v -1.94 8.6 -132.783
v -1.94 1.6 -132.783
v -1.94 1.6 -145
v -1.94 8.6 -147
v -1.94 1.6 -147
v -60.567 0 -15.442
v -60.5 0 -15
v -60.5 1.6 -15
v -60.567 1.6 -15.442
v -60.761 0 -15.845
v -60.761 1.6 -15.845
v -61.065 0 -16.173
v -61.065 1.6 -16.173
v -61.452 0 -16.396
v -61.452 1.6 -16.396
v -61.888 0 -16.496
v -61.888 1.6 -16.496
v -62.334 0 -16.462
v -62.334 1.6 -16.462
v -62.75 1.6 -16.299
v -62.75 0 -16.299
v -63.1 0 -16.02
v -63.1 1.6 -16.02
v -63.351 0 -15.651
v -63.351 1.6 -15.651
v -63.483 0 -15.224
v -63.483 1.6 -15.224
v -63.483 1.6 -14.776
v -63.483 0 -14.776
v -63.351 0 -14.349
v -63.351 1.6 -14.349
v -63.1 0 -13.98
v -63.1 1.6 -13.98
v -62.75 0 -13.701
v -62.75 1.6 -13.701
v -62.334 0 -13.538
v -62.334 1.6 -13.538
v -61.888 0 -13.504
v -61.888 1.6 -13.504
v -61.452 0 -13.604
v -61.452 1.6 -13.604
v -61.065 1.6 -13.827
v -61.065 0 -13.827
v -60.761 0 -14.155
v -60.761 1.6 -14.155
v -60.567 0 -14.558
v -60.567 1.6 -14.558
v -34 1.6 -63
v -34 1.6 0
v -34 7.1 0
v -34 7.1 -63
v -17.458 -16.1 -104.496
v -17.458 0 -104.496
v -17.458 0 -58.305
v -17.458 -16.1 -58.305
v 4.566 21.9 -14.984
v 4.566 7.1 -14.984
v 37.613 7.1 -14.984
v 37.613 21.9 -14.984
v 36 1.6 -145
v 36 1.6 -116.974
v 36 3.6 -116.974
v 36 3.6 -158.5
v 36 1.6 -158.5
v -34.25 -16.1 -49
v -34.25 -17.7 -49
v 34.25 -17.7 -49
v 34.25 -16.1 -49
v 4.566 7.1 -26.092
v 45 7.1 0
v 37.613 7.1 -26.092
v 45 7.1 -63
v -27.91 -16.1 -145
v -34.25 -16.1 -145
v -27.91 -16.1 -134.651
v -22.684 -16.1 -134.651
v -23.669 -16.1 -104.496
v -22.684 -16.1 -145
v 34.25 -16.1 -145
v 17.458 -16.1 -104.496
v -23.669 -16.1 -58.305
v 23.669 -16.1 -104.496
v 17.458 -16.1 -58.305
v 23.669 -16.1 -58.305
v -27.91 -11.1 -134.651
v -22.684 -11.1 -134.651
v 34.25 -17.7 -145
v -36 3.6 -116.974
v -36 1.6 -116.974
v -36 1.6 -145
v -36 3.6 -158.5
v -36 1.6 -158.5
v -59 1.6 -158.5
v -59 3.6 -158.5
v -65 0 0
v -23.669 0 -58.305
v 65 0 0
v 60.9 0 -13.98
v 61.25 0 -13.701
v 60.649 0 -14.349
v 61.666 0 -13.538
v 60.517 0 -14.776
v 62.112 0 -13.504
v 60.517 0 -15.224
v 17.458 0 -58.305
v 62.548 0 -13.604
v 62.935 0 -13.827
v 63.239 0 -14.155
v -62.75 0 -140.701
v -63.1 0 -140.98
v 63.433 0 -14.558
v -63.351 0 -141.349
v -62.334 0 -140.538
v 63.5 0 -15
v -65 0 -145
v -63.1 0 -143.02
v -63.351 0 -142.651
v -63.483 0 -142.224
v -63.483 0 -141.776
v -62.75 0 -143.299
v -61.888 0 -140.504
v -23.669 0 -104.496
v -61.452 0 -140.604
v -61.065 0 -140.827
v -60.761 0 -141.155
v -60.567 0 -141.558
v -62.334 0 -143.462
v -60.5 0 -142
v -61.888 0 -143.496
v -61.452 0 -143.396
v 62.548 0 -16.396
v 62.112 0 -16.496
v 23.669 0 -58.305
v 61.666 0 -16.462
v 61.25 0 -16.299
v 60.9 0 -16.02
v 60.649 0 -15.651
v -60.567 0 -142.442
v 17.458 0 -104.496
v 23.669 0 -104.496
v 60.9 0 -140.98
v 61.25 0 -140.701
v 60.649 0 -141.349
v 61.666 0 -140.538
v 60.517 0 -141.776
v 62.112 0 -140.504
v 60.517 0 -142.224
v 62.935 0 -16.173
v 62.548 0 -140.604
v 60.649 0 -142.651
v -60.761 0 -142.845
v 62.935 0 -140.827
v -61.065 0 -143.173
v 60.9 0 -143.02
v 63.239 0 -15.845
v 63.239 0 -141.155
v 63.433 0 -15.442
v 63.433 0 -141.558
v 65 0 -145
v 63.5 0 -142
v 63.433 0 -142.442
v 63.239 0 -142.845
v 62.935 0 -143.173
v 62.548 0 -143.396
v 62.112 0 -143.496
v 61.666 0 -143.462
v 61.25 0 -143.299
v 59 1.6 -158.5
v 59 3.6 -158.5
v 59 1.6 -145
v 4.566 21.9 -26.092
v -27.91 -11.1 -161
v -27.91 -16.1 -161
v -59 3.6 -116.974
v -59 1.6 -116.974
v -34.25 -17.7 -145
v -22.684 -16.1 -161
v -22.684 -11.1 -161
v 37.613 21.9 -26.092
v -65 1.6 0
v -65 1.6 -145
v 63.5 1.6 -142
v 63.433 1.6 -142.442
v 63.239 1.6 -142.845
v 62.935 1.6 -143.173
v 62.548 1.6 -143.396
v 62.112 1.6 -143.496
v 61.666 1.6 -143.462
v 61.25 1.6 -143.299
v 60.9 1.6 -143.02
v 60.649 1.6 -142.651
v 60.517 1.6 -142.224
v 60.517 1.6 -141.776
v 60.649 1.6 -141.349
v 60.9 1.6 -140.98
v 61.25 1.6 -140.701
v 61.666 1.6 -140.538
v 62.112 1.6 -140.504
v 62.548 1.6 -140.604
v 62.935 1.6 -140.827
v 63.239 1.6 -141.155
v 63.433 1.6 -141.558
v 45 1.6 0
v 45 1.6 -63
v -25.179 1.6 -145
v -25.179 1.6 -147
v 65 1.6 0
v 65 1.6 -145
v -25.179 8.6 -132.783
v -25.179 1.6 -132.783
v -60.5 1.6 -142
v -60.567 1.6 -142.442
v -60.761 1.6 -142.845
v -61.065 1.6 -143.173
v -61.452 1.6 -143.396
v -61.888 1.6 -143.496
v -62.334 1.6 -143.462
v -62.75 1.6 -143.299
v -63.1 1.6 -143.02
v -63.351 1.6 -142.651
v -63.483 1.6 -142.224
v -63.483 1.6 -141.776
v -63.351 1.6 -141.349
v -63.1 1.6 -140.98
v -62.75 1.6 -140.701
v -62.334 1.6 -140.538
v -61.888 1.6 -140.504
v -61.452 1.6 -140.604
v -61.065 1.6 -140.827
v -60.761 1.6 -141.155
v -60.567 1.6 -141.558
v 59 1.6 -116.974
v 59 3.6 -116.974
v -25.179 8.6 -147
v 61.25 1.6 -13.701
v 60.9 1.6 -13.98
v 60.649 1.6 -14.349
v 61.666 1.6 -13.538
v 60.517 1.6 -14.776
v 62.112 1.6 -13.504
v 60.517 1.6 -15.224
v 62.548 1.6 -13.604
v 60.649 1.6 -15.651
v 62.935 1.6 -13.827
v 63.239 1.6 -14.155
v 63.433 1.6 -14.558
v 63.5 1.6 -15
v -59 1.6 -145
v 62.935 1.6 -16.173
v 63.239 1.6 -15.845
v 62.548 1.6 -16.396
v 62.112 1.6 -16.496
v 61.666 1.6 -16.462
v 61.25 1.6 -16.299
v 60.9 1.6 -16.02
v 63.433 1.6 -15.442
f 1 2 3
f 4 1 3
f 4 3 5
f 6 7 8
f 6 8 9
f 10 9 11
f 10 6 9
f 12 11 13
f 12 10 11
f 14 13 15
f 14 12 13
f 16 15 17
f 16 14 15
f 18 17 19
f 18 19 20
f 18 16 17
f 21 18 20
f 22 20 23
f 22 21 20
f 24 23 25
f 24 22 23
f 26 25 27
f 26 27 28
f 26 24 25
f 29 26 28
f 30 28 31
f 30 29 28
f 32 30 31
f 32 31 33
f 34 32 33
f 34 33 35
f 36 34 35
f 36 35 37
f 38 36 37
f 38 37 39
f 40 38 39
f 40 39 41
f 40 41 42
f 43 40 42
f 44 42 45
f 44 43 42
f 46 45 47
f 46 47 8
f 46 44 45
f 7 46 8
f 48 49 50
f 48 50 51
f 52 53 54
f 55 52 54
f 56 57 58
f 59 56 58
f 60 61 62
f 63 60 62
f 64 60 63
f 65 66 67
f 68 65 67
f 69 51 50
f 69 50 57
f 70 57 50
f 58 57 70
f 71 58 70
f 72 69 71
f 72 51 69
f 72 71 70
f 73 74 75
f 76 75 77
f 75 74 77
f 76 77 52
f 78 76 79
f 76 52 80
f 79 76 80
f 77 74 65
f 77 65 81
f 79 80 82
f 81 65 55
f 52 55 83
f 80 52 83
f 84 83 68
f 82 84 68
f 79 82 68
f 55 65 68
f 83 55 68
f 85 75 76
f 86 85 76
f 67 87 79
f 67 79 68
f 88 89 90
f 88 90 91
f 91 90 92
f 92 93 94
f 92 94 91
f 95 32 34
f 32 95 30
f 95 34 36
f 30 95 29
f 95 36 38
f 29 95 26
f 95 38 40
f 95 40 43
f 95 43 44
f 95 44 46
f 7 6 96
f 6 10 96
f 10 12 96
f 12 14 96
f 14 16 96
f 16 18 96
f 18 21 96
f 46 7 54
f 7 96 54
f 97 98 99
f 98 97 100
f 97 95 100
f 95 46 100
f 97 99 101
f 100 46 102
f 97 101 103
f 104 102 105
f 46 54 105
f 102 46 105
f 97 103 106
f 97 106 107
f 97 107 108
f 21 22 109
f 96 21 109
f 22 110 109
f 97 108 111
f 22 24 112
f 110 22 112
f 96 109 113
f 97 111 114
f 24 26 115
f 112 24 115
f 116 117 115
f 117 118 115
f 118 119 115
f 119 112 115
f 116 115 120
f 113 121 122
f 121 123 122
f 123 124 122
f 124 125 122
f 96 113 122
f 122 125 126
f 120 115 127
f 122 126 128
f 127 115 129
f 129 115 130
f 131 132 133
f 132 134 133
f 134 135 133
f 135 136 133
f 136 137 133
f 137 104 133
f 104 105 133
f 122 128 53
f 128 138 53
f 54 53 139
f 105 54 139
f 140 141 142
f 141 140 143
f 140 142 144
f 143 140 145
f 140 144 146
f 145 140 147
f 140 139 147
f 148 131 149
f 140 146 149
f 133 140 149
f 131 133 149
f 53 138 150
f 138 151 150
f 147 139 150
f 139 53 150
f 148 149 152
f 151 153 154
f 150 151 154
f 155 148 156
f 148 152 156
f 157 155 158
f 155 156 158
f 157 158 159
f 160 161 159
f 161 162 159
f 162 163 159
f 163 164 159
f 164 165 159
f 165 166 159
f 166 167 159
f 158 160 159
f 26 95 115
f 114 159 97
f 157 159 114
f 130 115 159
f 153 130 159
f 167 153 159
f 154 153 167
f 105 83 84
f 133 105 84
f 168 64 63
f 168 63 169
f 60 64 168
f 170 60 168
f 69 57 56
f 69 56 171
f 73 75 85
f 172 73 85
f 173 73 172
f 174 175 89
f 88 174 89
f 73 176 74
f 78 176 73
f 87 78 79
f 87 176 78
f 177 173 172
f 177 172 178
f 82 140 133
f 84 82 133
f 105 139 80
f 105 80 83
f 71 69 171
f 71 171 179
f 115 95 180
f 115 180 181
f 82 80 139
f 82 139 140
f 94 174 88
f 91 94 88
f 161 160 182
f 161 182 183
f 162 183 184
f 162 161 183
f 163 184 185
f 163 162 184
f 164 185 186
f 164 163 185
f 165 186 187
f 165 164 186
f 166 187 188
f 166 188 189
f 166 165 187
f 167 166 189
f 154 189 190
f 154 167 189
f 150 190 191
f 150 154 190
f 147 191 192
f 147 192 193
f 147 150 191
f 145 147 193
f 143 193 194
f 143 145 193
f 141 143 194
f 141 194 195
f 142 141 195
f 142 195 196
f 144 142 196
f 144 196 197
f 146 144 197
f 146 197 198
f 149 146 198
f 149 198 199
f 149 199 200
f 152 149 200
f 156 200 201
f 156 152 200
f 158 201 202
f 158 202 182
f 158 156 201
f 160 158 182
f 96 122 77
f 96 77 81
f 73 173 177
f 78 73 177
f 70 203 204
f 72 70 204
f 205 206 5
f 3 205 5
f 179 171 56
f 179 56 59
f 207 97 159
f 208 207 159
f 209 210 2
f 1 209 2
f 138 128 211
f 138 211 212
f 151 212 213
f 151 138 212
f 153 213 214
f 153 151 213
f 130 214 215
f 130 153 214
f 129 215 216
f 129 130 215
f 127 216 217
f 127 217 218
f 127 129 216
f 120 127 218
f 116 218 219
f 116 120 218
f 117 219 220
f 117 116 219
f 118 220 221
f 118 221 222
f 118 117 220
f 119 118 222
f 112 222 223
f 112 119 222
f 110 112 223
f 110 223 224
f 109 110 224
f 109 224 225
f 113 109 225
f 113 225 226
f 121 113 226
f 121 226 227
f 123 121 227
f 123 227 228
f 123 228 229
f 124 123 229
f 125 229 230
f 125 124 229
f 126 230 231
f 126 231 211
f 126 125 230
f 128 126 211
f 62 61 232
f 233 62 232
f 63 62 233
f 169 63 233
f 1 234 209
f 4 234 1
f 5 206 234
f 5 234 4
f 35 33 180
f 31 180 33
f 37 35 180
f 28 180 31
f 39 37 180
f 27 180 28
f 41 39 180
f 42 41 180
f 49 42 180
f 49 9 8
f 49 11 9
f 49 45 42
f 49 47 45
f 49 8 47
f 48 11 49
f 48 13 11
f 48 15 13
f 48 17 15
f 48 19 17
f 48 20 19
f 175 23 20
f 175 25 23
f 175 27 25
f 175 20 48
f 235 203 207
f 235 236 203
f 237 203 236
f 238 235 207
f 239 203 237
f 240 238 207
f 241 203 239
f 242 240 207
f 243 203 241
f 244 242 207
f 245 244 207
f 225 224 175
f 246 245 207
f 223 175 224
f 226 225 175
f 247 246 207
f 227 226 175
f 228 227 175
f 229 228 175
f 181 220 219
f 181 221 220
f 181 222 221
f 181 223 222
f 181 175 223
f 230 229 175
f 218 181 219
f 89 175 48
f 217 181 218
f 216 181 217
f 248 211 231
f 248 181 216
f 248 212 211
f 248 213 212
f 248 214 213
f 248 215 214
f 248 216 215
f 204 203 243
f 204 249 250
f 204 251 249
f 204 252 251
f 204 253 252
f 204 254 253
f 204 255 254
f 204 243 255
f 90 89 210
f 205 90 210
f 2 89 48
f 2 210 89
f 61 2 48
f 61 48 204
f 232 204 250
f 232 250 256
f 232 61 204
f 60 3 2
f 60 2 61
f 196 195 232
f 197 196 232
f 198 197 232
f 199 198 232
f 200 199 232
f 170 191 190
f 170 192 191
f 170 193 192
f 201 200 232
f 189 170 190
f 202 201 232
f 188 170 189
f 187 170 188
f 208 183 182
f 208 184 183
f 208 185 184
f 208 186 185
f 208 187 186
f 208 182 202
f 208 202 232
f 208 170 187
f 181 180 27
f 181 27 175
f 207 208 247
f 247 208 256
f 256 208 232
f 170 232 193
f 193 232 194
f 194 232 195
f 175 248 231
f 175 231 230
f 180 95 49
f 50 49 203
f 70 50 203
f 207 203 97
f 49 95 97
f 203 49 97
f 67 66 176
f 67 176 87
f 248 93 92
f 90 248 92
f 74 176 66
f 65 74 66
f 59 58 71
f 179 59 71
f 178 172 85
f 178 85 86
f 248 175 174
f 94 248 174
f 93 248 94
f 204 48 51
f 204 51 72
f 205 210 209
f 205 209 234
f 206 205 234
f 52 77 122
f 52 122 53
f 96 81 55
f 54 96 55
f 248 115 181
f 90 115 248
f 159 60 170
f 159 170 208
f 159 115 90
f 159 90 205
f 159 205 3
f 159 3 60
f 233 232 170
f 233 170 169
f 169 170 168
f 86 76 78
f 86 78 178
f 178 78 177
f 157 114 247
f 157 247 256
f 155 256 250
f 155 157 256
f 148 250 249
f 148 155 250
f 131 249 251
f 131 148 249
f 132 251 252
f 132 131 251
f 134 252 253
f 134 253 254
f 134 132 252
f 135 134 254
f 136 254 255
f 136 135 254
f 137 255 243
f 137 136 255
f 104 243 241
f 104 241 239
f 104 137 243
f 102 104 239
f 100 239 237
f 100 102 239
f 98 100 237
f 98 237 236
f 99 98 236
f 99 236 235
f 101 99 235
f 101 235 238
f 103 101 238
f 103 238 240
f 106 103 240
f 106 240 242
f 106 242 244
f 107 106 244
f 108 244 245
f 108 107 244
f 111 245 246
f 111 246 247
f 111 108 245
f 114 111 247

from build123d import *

# Parameters (mm, degrees)
ESQUISSE1_W        = 130
ESQUISSE1_H        = 145
ESQUISSE1_R        = 1.5
BOSS_EXTRU_1_DEPTH = 1.6
ESQUISSE2_W        = 79
ESQUISSE2_H        = 63
BOSS_EXTRU_2_DEPTH = 5.5
ESQUISSE3_W        = 33.047140846
ESQUISSE3_H        = 11.107836296
BOSS_EXTRU_3_DEPTH = 14.8
ESQUISSE4_W        = 23.239665889
ESQUISSE4_H        = 14.216628141
BOSS_EXTRU_4_DEPTH = 7
ESQUISSE5_W        = 23
ESQUISSE5_H        = 41.525911652
BOSS_EXTRU_5_DEPTH = 2
ESQUISSE6_W        = 6.210910455
ESQUISSE6_H        = 46.190495577
BOSS_EXTRU_6_DEPTH = 17.7
ESQUISSE7_W        = 68.5
ESQUISSE7_H        = 96
BOSS_EXTRU_7_DEPTH = 1.6
ESQUISSE8_W        = 5.226174608
ESQUISSE8_H        = 26.34937469
BOSS_EXTRU_8_DEPTH = 5


with BuildPart() as part:
    # Esquisse1 → Boss.-Extru.1 (new body)
    with BuildSketch(Plane(origin=(0, 0, 0), x_dir=(1, 0, 0), z_dir=(0, 1, 0))):
        with Locations((0, 72.5)):
            Rectangle(ESQUISSE1_W, ESQUISSE1_H)
        with Locations((-62, 142)):
            Circle(ESQUISSE1_R, mode=Mode.SUBTRACT)
        with Locations((62, 142)):
            Circle(ESQUISSE1_R, mode=Mode.SUBTRACT)
        with Locations((62, 15)):
            Circle(ESQUISSE1_R, mode=Mode.SUBTRACT)
        with Locations((-62, 15)):
            Circle(ESQUISSE1_R, mode=Mode.SUBTRACT)
    extrude(amount=BOSS_EXTRU_1_DEPTH)

    # Esquisse2 → Boss.-Extru.2 (add)
    with BuildSketch(Plane(origin=(0, 1.6, 0), x_dir=(1, 0, 0), z_dir=(0, 1, 0))):
        with Locations((5.5, 31.5)):
            Rectangle(ESQUISSE2_W, ESQUISSE2_H)
    extrude(amount=BOSS_EXTRU_2_DEPTH)

    # Esquisse3 → Boss.-Extru.3 (add)
    with BuildSketch(Plane(origin=(0, 7.1, 0), x_dir=(1, 0, 0), z_dir=(0, 1, 0))):
        with Locations((21.089415125, 20.538253018)):
            Rectangle(ESQUISSE3_W, ESQUISSE3_H)
    extrude(amount=BOSS_EXTRU_3_DEPTH)

    # Esquisse4 → Boss.-Extru.4 (add)
    with BuildSketch(Plane(origin=(0, 1.6, 0), x_dir=(1, 0, 0), z_dir=(0, 1, 0))):
        with Locations((-13.559579353, 139.891685929)):
            Rectangle(ESQUISSE4_W, ESQUISSE4_H)
    extrude(amount=BOSS_EXTRU_4_DEPTH)

    # Esquisse5 → Boss.-Extru.5 (add)
    with BuildSketch(Plane(origin=(0, 1.6, 0), x_dir=(1, 0, 0), z_dir=(0, 1, 0))):
        with Locations((-47.5, 137.737044174)):
            Rectangle(ESQUISSE5_W, ESQUISSE5_H)
        with Locations((47.5, 137.737044174)):
            Rectangle(ESQUISSE5_W, ESQUISSE5_H)
    extrude(amount=BOSS_EXTRU_5_DEPTH)

    # Esquisse6 → Boss.-Extru.6 (add)
    with BuildSketch(Plane.XZ):
        with Locations((20.563763626, -81.400742682)):
            Rectangle(ESQUISSE6_W, ESQUISSE6_H)
        with Locations((-20.563763626, -81.400742682)):
            Rectangle(ESQUISSE6_W, ESQUISSE6_H)
    extrude(amount=BOSS_EXTRU_6_DEPTH)

    # Esquisse7 → Boss.-Extru.7 (add)
    with BuildSketch(Plane.XZ.offset(17.7)):
        with Locations((0, -97)):
            Rectangle(ESQUISSE7_W, ESQUISSE7_H)
    extrude(amount=-BOSS_EXTRU_7_DEPTH)

    # Esquisse8 → Boss.-Extru.8 (add)
    with BuildSketch(Plane(origin=(0, -16.1, 0), x_dir=(1, 0, 0), z_dir=(0, 1, 0))):
        with Locations((-25.296871339, 147.825312655)):
            Rectangle(ESQUISSE8_W, ESQUISSE8_H)
    extrude(amount=BOSS_EXTRU_8_DEPTH)


solid = part.part
